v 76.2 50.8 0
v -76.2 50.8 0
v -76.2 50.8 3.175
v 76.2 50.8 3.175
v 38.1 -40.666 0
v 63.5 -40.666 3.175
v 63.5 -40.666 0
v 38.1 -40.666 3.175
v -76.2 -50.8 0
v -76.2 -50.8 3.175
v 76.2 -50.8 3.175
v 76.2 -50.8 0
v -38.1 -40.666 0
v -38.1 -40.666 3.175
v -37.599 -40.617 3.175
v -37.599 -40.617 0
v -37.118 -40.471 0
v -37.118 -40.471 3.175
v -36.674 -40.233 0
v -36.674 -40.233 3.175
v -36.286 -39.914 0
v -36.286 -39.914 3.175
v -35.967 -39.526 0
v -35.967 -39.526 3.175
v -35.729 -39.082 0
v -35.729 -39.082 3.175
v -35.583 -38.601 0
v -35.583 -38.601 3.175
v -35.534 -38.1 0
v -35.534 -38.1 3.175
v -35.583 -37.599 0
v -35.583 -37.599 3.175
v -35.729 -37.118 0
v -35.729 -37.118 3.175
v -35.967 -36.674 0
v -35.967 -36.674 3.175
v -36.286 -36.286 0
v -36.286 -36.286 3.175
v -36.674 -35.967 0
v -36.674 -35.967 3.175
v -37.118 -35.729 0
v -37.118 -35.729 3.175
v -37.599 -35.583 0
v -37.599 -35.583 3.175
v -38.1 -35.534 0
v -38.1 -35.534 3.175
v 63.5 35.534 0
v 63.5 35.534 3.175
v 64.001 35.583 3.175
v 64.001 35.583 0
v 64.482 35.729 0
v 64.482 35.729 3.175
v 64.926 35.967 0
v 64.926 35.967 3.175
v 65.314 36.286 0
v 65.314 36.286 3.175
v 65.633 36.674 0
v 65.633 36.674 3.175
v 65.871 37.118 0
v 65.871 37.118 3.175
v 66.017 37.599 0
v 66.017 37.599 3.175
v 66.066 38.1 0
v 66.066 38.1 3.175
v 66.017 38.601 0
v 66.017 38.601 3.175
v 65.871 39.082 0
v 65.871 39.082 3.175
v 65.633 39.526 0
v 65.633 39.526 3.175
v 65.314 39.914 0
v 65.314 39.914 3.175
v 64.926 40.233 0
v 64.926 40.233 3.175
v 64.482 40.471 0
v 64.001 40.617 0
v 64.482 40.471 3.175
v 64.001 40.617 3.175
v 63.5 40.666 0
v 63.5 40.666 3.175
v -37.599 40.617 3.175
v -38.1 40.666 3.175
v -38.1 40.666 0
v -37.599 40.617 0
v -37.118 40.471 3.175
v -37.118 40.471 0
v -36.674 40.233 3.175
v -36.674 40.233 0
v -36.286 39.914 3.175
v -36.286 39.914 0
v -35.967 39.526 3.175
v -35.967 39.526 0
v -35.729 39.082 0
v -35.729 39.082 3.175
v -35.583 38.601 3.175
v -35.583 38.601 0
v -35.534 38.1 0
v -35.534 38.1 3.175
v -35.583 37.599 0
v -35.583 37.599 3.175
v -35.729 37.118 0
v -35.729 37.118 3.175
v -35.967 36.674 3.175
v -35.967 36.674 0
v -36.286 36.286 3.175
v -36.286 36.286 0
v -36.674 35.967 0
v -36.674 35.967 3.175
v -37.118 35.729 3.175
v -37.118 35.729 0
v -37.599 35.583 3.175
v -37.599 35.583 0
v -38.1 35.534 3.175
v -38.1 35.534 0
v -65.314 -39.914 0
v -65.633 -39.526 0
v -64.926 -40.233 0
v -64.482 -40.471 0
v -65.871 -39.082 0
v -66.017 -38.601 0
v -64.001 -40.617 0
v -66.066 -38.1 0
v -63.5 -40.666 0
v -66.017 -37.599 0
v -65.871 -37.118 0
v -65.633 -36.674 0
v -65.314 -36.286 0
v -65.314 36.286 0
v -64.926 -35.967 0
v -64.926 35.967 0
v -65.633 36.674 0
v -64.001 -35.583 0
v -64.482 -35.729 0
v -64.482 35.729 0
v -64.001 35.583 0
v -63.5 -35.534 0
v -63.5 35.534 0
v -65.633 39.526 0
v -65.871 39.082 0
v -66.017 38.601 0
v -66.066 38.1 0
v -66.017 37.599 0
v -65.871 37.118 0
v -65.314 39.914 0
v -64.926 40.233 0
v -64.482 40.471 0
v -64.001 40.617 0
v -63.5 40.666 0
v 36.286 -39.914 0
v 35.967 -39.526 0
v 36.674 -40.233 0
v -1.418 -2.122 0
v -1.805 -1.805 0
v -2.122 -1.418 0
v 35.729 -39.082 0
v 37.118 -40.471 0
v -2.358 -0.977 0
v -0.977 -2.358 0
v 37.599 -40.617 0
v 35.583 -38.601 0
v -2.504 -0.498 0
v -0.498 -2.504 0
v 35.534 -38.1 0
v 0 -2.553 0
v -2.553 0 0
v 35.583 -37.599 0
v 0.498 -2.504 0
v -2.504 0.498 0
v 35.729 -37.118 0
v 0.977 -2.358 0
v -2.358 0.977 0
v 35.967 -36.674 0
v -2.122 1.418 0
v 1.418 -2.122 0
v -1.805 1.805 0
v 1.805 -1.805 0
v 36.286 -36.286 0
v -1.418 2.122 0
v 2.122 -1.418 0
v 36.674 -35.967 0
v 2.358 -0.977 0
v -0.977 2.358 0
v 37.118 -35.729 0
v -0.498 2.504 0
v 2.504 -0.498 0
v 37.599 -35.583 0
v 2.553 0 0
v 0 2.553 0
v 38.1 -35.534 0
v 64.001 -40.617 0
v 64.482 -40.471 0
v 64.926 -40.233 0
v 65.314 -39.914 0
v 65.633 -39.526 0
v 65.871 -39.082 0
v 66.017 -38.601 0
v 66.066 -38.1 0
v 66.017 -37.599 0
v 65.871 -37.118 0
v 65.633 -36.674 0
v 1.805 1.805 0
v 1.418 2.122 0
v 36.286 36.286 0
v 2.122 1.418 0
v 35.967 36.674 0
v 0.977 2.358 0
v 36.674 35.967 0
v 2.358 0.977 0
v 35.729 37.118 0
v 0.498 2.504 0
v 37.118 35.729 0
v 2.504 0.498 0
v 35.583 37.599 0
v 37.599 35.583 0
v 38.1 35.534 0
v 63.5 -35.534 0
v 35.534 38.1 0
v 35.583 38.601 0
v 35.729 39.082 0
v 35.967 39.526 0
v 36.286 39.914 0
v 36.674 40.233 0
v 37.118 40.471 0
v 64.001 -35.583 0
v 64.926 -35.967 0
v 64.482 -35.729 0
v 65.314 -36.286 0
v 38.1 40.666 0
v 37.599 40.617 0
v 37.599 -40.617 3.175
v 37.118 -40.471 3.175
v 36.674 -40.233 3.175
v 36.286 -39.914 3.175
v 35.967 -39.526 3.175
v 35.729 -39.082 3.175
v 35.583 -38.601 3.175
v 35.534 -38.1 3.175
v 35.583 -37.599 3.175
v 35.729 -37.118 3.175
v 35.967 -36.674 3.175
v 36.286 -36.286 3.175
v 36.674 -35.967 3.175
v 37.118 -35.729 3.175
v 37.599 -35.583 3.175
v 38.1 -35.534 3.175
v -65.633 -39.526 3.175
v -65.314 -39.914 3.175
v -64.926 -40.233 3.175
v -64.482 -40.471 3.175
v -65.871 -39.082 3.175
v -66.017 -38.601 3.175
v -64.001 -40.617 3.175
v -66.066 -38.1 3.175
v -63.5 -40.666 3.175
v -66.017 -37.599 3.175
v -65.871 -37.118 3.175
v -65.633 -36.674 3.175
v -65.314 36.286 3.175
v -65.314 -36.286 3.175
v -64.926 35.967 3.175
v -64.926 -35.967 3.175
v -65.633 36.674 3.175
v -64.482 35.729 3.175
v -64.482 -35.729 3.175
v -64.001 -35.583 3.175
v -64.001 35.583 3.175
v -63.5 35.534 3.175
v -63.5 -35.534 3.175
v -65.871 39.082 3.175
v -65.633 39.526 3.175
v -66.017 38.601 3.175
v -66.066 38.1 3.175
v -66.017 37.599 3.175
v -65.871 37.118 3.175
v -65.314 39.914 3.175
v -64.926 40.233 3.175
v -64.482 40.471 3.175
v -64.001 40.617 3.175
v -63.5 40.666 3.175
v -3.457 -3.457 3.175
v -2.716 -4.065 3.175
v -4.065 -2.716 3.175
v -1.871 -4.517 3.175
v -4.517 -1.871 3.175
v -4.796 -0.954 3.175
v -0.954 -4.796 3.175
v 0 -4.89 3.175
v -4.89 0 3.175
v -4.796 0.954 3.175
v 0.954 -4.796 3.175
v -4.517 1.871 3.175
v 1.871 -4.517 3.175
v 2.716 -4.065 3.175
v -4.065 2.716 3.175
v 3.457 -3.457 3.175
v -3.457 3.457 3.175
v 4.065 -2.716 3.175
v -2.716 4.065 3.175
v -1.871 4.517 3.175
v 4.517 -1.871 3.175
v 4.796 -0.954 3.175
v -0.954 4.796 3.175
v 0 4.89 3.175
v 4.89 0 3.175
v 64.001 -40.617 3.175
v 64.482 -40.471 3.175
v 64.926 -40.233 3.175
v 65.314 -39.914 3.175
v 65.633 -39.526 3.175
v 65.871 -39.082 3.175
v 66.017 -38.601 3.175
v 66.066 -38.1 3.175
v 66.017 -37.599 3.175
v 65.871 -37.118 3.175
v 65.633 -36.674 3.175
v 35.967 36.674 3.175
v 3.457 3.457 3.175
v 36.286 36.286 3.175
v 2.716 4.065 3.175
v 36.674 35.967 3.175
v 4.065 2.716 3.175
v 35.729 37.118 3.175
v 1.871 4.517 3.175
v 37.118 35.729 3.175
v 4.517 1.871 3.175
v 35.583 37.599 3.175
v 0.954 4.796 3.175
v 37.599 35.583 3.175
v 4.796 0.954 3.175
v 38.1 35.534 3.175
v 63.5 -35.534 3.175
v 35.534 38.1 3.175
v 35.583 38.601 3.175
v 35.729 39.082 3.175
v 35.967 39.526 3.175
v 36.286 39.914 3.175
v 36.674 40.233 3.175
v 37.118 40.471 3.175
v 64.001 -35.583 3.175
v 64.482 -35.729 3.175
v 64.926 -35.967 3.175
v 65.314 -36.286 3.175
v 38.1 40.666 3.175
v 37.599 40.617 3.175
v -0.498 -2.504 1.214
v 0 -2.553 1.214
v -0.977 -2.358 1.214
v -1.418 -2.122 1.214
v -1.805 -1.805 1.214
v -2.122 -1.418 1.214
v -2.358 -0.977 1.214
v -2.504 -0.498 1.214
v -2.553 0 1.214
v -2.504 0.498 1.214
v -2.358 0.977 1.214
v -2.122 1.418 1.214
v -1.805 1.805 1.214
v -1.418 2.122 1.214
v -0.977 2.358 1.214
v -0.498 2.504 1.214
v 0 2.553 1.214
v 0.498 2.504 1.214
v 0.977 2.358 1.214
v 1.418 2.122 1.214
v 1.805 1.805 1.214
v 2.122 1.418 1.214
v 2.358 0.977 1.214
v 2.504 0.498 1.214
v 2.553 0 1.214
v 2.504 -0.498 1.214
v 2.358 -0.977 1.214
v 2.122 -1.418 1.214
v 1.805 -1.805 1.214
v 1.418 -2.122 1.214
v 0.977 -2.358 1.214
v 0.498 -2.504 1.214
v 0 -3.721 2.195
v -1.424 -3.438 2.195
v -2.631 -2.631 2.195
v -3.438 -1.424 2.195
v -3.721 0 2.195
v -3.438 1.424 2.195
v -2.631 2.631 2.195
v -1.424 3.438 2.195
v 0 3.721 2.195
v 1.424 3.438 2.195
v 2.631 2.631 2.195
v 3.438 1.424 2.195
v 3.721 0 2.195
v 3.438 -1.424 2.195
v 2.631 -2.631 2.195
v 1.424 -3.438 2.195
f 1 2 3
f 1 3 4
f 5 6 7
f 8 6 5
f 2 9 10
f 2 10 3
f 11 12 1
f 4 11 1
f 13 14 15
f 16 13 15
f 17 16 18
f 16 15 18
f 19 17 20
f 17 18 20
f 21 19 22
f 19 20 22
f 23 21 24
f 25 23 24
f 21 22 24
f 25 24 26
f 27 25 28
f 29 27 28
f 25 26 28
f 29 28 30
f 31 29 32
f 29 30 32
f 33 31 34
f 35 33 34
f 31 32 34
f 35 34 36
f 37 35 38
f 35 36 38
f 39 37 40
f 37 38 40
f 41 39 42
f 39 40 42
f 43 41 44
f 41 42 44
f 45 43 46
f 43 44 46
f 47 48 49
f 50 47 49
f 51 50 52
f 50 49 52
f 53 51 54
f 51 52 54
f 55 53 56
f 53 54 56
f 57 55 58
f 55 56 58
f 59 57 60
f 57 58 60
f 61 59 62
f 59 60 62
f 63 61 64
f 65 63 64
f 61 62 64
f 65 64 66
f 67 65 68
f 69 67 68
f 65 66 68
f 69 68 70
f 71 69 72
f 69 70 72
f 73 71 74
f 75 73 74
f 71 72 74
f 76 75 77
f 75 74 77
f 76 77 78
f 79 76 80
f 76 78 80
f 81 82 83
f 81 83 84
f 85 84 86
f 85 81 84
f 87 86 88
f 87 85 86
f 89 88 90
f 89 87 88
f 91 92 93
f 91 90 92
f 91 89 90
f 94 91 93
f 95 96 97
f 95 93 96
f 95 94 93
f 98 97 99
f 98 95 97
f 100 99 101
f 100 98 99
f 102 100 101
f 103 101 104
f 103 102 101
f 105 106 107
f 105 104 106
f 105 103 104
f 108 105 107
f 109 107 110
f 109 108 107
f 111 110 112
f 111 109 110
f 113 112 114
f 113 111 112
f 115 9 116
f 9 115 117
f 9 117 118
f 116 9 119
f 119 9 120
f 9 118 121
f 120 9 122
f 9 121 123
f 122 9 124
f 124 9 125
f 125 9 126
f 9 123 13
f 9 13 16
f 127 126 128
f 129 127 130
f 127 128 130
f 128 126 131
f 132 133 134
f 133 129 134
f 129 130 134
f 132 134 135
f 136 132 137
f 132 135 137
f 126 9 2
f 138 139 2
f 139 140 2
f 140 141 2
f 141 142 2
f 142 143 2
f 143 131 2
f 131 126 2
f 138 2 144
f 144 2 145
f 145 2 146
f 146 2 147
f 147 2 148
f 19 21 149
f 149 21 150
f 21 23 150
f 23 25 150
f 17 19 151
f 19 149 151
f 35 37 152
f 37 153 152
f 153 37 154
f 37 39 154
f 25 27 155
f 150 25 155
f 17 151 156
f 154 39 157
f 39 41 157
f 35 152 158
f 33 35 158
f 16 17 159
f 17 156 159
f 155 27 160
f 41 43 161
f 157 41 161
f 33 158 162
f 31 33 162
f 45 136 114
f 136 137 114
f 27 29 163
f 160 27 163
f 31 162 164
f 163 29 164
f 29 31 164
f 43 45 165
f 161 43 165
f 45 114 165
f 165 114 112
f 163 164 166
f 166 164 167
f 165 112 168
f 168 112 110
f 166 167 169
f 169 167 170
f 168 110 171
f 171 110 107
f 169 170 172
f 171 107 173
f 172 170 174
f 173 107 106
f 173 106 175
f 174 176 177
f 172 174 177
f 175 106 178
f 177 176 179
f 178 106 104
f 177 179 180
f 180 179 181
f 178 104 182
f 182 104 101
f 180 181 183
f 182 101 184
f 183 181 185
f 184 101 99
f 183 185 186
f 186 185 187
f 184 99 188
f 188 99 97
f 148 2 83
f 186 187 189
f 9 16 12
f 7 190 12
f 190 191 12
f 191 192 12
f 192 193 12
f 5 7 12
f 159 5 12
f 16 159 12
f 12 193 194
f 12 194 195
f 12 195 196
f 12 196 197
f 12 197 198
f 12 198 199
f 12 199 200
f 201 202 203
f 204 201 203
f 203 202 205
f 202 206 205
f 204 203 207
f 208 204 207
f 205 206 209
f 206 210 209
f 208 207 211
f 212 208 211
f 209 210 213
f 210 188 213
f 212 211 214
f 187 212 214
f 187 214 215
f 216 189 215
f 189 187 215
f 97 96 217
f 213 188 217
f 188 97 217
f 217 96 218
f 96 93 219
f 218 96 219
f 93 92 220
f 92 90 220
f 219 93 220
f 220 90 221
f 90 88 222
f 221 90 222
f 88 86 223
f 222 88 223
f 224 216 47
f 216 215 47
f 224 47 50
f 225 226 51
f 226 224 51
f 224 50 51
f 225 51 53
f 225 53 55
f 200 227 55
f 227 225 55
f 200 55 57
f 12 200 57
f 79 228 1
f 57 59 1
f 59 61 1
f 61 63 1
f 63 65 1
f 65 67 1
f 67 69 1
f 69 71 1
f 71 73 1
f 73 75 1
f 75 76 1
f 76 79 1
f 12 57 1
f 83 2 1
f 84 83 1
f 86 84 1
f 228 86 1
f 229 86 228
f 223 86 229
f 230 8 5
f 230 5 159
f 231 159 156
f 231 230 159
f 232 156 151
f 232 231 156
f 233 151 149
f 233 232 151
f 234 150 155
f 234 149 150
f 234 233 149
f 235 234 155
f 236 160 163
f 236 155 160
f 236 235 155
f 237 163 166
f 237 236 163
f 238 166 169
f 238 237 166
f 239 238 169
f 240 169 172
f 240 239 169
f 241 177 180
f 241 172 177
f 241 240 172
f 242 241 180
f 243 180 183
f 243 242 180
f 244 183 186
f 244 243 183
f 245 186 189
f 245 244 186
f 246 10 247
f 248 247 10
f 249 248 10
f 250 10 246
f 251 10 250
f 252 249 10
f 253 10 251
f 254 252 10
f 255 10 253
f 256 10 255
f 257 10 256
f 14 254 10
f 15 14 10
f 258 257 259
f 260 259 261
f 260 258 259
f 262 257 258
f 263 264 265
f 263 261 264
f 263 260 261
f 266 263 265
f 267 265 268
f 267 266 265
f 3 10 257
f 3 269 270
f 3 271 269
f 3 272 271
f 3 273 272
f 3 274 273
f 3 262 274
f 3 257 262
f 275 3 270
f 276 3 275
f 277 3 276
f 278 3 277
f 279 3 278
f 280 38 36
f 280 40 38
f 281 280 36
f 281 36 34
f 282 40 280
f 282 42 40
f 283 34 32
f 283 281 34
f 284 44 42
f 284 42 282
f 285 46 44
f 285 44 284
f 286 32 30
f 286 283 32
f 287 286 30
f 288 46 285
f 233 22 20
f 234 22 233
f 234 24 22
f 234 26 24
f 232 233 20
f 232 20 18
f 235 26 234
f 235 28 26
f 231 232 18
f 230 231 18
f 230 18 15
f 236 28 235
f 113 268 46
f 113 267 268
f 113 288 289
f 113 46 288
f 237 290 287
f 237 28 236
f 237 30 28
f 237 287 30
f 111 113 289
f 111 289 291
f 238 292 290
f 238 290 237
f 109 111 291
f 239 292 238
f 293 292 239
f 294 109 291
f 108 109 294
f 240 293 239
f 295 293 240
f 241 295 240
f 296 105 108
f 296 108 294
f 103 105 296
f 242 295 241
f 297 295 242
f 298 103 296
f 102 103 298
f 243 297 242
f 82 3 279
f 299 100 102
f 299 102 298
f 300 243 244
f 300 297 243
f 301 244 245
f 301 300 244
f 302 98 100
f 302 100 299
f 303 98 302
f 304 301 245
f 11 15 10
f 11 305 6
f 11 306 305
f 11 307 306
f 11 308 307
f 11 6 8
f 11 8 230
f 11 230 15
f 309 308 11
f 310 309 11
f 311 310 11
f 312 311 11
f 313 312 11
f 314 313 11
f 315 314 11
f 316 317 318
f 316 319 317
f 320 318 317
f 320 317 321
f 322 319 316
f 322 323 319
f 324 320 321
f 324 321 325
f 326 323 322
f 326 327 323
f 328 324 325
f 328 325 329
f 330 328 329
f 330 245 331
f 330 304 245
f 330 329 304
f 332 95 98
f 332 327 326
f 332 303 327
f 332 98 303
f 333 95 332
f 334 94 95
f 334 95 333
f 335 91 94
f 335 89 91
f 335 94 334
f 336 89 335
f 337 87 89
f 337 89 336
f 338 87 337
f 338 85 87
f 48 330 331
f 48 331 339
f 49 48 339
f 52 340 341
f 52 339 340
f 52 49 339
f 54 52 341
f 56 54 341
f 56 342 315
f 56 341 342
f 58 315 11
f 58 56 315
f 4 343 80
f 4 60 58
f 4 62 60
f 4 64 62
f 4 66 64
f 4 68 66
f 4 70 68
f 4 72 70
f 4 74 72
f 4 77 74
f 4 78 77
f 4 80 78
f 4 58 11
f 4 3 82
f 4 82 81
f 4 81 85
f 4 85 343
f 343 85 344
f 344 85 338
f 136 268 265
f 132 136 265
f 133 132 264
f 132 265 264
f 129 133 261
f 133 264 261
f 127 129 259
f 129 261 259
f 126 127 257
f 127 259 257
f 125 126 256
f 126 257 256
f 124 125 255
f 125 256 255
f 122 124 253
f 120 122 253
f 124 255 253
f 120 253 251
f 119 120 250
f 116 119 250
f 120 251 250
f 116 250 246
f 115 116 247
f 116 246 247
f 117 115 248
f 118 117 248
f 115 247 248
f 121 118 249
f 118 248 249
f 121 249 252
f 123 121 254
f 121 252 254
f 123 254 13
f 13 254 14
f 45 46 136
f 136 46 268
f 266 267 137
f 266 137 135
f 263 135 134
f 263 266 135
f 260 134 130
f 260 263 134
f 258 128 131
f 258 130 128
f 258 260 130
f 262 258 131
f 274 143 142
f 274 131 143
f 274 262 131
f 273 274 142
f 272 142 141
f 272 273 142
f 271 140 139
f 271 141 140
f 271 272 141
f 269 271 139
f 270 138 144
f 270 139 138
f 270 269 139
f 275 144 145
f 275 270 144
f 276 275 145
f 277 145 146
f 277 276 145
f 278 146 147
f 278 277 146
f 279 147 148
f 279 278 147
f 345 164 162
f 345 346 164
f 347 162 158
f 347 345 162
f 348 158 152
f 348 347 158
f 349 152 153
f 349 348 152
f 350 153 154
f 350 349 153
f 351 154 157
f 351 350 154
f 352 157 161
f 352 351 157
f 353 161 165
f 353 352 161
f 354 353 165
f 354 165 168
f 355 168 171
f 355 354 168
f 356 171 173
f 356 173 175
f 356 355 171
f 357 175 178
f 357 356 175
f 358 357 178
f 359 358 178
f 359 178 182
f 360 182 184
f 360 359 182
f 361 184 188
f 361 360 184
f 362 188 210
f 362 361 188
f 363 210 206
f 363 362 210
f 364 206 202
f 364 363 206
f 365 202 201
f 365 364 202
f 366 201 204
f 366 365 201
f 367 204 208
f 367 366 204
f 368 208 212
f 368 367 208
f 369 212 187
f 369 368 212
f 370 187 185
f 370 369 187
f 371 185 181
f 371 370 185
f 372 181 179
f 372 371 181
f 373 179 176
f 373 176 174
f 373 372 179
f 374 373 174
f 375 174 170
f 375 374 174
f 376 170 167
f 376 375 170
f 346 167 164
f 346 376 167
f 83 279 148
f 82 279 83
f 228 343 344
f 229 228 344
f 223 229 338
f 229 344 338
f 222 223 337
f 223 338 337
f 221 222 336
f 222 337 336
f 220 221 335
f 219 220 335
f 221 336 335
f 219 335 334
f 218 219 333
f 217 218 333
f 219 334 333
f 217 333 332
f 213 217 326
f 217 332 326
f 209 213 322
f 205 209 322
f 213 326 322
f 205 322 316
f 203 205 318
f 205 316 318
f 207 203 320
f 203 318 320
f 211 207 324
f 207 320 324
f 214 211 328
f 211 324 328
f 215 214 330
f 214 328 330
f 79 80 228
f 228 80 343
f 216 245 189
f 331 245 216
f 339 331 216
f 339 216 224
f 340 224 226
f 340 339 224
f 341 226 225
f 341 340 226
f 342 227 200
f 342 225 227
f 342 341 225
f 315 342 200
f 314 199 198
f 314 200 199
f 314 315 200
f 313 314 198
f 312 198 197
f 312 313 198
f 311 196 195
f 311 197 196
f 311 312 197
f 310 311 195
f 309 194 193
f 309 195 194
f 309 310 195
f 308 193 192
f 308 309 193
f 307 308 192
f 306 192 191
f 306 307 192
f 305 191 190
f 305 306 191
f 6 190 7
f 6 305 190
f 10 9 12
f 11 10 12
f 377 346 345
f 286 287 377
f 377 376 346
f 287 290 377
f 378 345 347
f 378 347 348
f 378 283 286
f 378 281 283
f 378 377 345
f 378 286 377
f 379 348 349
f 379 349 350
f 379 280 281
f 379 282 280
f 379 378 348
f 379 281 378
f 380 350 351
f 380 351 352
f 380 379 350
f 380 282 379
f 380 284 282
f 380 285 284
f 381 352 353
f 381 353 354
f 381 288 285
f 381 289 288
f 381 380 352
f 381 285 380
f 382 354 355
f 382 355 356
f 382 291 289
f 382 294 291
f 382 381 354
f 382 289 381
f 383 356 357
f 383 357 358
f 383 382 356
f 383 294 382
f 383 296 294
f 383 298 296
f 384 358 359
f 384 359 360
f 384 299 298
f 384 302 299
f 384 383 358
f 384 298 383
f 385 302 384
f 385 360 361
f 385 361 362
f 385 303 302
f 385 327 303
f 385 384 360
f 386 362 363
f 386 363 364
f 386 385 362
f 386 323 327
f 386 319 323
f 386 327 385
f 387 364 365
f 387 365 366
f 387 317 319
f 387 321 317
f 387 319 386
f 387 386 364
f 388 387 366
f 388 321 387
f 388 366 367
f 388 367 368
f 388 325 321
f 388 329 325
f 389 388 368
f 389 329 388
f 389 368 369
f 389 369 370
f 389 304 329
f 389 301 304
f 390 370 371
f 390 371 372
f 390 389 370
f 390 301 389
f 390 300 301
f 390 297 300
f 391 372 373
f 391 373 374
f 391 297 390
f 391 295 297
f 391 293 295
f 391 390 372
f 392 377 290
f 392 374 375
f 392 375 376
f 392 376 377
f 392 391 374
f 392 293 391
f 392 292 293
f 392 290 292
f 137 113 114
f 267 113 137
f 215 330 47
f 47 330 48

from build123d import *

# Parameters (mm, degrees)
SKETCH1_W            = 152.4
SKETCH1_H            = 101.6
BOSS_EXTRUDE1_DEPTH  = 3.175
CUT_EXTRUDE1_DEPTH   = 92.636022529
MIRROR2_COPY_1_DEPTH = 92.636022529


with BuildPart() as part:
    # Sketch1 → Boss-Extrude1 (new body)
    with BuildSketch(Plane.XY):
        Rectangle(SKETCH1_W, SKETCH1_H)
    extrude(amount=BOSS_EXTRUDE1_DEPTH)

    # Sketch2 → Cut-Extrude1 (cut, symmetric)
    with BuildSketch(Plane.XY.offset(3.175)):
        with BuildLine():
            Line((-63.5, 40.665937046), (-38.1, 40.665937046))
            ThreePointArc((-38.1, 40.665937046), (-35.534062954, 38.1), (-38.1, 35.534062954))
            Line((-38.1, 35.534062954), (-63.5, 35.534062954))
            ThreePointArc((-63.5, 35.534062954), (-66.065937046, 38.1), (-63.5, 40.665937046))
        make_face()
    cut_extrude1 = extrude(amount=CUT_EXTRUDE1_DEPTH, both=True, mode=Mode.SUBTRACT)

    # Mirror1: Cut-Extrude1 across plane
    add(cut_extrude1.mirror(Plane(origin=(0, 0, 0), x_dir=(0, 0, 1), z_dir=(1, 0, 0))), mode=Mode.SUBTRACT)

    # Mirror2: Cut-Extrude1 across plane
    add(cut_extrude1.mirror(Plane.ZX), mode=Mode.SUBTRACT)

    # Mirror2 copy 1 sketch → Mirror2 copy 1 (cut, symmetric)
    with BuildSketch(Plane(origin=(0, 0, 3.175), x_dir=(-1, 0, 0), z_dir=(0, 0, 1))):
        with BuildLine():
            Line((-63.5, 40.665937046), (-38.1, 40.665937046))
            ThreePointArc((-38.1, 40.665937046), (-35.534062954, 38.1), (-38.1, 35.534062954))
            Line((-38.1, 35.534062954), (-63.5, 35.534062954))
            ThreePointArc((-63.5, 35.534062954), (-66.065937046, 38.1), (-63.5, 40.665937046))
        make_face()
    extrude(amount=MIRROR2_COPY_1_DEPTH, both=True, mode=Mode.SUBTRACT)

    # Sketch5 → CSK for #10 Flat Head Machine Screw (100)1 (revolve, cut)
    with BuildSketch(Plane(origin=(0, 0, 3.175), x_dir=(0, -1, 0), z_dir=(1, 0, 0))):
        Polygon((0, 0), (0, 3.175), (2.5527, 3.175), (2.5527, 1.960808018), (4.8895, 0), align=None)
    revolve(axis=Axis((0, 0, 9.525), (0, 0, -1)), mode=Mode.SUBTRACT)


solid = part.part
